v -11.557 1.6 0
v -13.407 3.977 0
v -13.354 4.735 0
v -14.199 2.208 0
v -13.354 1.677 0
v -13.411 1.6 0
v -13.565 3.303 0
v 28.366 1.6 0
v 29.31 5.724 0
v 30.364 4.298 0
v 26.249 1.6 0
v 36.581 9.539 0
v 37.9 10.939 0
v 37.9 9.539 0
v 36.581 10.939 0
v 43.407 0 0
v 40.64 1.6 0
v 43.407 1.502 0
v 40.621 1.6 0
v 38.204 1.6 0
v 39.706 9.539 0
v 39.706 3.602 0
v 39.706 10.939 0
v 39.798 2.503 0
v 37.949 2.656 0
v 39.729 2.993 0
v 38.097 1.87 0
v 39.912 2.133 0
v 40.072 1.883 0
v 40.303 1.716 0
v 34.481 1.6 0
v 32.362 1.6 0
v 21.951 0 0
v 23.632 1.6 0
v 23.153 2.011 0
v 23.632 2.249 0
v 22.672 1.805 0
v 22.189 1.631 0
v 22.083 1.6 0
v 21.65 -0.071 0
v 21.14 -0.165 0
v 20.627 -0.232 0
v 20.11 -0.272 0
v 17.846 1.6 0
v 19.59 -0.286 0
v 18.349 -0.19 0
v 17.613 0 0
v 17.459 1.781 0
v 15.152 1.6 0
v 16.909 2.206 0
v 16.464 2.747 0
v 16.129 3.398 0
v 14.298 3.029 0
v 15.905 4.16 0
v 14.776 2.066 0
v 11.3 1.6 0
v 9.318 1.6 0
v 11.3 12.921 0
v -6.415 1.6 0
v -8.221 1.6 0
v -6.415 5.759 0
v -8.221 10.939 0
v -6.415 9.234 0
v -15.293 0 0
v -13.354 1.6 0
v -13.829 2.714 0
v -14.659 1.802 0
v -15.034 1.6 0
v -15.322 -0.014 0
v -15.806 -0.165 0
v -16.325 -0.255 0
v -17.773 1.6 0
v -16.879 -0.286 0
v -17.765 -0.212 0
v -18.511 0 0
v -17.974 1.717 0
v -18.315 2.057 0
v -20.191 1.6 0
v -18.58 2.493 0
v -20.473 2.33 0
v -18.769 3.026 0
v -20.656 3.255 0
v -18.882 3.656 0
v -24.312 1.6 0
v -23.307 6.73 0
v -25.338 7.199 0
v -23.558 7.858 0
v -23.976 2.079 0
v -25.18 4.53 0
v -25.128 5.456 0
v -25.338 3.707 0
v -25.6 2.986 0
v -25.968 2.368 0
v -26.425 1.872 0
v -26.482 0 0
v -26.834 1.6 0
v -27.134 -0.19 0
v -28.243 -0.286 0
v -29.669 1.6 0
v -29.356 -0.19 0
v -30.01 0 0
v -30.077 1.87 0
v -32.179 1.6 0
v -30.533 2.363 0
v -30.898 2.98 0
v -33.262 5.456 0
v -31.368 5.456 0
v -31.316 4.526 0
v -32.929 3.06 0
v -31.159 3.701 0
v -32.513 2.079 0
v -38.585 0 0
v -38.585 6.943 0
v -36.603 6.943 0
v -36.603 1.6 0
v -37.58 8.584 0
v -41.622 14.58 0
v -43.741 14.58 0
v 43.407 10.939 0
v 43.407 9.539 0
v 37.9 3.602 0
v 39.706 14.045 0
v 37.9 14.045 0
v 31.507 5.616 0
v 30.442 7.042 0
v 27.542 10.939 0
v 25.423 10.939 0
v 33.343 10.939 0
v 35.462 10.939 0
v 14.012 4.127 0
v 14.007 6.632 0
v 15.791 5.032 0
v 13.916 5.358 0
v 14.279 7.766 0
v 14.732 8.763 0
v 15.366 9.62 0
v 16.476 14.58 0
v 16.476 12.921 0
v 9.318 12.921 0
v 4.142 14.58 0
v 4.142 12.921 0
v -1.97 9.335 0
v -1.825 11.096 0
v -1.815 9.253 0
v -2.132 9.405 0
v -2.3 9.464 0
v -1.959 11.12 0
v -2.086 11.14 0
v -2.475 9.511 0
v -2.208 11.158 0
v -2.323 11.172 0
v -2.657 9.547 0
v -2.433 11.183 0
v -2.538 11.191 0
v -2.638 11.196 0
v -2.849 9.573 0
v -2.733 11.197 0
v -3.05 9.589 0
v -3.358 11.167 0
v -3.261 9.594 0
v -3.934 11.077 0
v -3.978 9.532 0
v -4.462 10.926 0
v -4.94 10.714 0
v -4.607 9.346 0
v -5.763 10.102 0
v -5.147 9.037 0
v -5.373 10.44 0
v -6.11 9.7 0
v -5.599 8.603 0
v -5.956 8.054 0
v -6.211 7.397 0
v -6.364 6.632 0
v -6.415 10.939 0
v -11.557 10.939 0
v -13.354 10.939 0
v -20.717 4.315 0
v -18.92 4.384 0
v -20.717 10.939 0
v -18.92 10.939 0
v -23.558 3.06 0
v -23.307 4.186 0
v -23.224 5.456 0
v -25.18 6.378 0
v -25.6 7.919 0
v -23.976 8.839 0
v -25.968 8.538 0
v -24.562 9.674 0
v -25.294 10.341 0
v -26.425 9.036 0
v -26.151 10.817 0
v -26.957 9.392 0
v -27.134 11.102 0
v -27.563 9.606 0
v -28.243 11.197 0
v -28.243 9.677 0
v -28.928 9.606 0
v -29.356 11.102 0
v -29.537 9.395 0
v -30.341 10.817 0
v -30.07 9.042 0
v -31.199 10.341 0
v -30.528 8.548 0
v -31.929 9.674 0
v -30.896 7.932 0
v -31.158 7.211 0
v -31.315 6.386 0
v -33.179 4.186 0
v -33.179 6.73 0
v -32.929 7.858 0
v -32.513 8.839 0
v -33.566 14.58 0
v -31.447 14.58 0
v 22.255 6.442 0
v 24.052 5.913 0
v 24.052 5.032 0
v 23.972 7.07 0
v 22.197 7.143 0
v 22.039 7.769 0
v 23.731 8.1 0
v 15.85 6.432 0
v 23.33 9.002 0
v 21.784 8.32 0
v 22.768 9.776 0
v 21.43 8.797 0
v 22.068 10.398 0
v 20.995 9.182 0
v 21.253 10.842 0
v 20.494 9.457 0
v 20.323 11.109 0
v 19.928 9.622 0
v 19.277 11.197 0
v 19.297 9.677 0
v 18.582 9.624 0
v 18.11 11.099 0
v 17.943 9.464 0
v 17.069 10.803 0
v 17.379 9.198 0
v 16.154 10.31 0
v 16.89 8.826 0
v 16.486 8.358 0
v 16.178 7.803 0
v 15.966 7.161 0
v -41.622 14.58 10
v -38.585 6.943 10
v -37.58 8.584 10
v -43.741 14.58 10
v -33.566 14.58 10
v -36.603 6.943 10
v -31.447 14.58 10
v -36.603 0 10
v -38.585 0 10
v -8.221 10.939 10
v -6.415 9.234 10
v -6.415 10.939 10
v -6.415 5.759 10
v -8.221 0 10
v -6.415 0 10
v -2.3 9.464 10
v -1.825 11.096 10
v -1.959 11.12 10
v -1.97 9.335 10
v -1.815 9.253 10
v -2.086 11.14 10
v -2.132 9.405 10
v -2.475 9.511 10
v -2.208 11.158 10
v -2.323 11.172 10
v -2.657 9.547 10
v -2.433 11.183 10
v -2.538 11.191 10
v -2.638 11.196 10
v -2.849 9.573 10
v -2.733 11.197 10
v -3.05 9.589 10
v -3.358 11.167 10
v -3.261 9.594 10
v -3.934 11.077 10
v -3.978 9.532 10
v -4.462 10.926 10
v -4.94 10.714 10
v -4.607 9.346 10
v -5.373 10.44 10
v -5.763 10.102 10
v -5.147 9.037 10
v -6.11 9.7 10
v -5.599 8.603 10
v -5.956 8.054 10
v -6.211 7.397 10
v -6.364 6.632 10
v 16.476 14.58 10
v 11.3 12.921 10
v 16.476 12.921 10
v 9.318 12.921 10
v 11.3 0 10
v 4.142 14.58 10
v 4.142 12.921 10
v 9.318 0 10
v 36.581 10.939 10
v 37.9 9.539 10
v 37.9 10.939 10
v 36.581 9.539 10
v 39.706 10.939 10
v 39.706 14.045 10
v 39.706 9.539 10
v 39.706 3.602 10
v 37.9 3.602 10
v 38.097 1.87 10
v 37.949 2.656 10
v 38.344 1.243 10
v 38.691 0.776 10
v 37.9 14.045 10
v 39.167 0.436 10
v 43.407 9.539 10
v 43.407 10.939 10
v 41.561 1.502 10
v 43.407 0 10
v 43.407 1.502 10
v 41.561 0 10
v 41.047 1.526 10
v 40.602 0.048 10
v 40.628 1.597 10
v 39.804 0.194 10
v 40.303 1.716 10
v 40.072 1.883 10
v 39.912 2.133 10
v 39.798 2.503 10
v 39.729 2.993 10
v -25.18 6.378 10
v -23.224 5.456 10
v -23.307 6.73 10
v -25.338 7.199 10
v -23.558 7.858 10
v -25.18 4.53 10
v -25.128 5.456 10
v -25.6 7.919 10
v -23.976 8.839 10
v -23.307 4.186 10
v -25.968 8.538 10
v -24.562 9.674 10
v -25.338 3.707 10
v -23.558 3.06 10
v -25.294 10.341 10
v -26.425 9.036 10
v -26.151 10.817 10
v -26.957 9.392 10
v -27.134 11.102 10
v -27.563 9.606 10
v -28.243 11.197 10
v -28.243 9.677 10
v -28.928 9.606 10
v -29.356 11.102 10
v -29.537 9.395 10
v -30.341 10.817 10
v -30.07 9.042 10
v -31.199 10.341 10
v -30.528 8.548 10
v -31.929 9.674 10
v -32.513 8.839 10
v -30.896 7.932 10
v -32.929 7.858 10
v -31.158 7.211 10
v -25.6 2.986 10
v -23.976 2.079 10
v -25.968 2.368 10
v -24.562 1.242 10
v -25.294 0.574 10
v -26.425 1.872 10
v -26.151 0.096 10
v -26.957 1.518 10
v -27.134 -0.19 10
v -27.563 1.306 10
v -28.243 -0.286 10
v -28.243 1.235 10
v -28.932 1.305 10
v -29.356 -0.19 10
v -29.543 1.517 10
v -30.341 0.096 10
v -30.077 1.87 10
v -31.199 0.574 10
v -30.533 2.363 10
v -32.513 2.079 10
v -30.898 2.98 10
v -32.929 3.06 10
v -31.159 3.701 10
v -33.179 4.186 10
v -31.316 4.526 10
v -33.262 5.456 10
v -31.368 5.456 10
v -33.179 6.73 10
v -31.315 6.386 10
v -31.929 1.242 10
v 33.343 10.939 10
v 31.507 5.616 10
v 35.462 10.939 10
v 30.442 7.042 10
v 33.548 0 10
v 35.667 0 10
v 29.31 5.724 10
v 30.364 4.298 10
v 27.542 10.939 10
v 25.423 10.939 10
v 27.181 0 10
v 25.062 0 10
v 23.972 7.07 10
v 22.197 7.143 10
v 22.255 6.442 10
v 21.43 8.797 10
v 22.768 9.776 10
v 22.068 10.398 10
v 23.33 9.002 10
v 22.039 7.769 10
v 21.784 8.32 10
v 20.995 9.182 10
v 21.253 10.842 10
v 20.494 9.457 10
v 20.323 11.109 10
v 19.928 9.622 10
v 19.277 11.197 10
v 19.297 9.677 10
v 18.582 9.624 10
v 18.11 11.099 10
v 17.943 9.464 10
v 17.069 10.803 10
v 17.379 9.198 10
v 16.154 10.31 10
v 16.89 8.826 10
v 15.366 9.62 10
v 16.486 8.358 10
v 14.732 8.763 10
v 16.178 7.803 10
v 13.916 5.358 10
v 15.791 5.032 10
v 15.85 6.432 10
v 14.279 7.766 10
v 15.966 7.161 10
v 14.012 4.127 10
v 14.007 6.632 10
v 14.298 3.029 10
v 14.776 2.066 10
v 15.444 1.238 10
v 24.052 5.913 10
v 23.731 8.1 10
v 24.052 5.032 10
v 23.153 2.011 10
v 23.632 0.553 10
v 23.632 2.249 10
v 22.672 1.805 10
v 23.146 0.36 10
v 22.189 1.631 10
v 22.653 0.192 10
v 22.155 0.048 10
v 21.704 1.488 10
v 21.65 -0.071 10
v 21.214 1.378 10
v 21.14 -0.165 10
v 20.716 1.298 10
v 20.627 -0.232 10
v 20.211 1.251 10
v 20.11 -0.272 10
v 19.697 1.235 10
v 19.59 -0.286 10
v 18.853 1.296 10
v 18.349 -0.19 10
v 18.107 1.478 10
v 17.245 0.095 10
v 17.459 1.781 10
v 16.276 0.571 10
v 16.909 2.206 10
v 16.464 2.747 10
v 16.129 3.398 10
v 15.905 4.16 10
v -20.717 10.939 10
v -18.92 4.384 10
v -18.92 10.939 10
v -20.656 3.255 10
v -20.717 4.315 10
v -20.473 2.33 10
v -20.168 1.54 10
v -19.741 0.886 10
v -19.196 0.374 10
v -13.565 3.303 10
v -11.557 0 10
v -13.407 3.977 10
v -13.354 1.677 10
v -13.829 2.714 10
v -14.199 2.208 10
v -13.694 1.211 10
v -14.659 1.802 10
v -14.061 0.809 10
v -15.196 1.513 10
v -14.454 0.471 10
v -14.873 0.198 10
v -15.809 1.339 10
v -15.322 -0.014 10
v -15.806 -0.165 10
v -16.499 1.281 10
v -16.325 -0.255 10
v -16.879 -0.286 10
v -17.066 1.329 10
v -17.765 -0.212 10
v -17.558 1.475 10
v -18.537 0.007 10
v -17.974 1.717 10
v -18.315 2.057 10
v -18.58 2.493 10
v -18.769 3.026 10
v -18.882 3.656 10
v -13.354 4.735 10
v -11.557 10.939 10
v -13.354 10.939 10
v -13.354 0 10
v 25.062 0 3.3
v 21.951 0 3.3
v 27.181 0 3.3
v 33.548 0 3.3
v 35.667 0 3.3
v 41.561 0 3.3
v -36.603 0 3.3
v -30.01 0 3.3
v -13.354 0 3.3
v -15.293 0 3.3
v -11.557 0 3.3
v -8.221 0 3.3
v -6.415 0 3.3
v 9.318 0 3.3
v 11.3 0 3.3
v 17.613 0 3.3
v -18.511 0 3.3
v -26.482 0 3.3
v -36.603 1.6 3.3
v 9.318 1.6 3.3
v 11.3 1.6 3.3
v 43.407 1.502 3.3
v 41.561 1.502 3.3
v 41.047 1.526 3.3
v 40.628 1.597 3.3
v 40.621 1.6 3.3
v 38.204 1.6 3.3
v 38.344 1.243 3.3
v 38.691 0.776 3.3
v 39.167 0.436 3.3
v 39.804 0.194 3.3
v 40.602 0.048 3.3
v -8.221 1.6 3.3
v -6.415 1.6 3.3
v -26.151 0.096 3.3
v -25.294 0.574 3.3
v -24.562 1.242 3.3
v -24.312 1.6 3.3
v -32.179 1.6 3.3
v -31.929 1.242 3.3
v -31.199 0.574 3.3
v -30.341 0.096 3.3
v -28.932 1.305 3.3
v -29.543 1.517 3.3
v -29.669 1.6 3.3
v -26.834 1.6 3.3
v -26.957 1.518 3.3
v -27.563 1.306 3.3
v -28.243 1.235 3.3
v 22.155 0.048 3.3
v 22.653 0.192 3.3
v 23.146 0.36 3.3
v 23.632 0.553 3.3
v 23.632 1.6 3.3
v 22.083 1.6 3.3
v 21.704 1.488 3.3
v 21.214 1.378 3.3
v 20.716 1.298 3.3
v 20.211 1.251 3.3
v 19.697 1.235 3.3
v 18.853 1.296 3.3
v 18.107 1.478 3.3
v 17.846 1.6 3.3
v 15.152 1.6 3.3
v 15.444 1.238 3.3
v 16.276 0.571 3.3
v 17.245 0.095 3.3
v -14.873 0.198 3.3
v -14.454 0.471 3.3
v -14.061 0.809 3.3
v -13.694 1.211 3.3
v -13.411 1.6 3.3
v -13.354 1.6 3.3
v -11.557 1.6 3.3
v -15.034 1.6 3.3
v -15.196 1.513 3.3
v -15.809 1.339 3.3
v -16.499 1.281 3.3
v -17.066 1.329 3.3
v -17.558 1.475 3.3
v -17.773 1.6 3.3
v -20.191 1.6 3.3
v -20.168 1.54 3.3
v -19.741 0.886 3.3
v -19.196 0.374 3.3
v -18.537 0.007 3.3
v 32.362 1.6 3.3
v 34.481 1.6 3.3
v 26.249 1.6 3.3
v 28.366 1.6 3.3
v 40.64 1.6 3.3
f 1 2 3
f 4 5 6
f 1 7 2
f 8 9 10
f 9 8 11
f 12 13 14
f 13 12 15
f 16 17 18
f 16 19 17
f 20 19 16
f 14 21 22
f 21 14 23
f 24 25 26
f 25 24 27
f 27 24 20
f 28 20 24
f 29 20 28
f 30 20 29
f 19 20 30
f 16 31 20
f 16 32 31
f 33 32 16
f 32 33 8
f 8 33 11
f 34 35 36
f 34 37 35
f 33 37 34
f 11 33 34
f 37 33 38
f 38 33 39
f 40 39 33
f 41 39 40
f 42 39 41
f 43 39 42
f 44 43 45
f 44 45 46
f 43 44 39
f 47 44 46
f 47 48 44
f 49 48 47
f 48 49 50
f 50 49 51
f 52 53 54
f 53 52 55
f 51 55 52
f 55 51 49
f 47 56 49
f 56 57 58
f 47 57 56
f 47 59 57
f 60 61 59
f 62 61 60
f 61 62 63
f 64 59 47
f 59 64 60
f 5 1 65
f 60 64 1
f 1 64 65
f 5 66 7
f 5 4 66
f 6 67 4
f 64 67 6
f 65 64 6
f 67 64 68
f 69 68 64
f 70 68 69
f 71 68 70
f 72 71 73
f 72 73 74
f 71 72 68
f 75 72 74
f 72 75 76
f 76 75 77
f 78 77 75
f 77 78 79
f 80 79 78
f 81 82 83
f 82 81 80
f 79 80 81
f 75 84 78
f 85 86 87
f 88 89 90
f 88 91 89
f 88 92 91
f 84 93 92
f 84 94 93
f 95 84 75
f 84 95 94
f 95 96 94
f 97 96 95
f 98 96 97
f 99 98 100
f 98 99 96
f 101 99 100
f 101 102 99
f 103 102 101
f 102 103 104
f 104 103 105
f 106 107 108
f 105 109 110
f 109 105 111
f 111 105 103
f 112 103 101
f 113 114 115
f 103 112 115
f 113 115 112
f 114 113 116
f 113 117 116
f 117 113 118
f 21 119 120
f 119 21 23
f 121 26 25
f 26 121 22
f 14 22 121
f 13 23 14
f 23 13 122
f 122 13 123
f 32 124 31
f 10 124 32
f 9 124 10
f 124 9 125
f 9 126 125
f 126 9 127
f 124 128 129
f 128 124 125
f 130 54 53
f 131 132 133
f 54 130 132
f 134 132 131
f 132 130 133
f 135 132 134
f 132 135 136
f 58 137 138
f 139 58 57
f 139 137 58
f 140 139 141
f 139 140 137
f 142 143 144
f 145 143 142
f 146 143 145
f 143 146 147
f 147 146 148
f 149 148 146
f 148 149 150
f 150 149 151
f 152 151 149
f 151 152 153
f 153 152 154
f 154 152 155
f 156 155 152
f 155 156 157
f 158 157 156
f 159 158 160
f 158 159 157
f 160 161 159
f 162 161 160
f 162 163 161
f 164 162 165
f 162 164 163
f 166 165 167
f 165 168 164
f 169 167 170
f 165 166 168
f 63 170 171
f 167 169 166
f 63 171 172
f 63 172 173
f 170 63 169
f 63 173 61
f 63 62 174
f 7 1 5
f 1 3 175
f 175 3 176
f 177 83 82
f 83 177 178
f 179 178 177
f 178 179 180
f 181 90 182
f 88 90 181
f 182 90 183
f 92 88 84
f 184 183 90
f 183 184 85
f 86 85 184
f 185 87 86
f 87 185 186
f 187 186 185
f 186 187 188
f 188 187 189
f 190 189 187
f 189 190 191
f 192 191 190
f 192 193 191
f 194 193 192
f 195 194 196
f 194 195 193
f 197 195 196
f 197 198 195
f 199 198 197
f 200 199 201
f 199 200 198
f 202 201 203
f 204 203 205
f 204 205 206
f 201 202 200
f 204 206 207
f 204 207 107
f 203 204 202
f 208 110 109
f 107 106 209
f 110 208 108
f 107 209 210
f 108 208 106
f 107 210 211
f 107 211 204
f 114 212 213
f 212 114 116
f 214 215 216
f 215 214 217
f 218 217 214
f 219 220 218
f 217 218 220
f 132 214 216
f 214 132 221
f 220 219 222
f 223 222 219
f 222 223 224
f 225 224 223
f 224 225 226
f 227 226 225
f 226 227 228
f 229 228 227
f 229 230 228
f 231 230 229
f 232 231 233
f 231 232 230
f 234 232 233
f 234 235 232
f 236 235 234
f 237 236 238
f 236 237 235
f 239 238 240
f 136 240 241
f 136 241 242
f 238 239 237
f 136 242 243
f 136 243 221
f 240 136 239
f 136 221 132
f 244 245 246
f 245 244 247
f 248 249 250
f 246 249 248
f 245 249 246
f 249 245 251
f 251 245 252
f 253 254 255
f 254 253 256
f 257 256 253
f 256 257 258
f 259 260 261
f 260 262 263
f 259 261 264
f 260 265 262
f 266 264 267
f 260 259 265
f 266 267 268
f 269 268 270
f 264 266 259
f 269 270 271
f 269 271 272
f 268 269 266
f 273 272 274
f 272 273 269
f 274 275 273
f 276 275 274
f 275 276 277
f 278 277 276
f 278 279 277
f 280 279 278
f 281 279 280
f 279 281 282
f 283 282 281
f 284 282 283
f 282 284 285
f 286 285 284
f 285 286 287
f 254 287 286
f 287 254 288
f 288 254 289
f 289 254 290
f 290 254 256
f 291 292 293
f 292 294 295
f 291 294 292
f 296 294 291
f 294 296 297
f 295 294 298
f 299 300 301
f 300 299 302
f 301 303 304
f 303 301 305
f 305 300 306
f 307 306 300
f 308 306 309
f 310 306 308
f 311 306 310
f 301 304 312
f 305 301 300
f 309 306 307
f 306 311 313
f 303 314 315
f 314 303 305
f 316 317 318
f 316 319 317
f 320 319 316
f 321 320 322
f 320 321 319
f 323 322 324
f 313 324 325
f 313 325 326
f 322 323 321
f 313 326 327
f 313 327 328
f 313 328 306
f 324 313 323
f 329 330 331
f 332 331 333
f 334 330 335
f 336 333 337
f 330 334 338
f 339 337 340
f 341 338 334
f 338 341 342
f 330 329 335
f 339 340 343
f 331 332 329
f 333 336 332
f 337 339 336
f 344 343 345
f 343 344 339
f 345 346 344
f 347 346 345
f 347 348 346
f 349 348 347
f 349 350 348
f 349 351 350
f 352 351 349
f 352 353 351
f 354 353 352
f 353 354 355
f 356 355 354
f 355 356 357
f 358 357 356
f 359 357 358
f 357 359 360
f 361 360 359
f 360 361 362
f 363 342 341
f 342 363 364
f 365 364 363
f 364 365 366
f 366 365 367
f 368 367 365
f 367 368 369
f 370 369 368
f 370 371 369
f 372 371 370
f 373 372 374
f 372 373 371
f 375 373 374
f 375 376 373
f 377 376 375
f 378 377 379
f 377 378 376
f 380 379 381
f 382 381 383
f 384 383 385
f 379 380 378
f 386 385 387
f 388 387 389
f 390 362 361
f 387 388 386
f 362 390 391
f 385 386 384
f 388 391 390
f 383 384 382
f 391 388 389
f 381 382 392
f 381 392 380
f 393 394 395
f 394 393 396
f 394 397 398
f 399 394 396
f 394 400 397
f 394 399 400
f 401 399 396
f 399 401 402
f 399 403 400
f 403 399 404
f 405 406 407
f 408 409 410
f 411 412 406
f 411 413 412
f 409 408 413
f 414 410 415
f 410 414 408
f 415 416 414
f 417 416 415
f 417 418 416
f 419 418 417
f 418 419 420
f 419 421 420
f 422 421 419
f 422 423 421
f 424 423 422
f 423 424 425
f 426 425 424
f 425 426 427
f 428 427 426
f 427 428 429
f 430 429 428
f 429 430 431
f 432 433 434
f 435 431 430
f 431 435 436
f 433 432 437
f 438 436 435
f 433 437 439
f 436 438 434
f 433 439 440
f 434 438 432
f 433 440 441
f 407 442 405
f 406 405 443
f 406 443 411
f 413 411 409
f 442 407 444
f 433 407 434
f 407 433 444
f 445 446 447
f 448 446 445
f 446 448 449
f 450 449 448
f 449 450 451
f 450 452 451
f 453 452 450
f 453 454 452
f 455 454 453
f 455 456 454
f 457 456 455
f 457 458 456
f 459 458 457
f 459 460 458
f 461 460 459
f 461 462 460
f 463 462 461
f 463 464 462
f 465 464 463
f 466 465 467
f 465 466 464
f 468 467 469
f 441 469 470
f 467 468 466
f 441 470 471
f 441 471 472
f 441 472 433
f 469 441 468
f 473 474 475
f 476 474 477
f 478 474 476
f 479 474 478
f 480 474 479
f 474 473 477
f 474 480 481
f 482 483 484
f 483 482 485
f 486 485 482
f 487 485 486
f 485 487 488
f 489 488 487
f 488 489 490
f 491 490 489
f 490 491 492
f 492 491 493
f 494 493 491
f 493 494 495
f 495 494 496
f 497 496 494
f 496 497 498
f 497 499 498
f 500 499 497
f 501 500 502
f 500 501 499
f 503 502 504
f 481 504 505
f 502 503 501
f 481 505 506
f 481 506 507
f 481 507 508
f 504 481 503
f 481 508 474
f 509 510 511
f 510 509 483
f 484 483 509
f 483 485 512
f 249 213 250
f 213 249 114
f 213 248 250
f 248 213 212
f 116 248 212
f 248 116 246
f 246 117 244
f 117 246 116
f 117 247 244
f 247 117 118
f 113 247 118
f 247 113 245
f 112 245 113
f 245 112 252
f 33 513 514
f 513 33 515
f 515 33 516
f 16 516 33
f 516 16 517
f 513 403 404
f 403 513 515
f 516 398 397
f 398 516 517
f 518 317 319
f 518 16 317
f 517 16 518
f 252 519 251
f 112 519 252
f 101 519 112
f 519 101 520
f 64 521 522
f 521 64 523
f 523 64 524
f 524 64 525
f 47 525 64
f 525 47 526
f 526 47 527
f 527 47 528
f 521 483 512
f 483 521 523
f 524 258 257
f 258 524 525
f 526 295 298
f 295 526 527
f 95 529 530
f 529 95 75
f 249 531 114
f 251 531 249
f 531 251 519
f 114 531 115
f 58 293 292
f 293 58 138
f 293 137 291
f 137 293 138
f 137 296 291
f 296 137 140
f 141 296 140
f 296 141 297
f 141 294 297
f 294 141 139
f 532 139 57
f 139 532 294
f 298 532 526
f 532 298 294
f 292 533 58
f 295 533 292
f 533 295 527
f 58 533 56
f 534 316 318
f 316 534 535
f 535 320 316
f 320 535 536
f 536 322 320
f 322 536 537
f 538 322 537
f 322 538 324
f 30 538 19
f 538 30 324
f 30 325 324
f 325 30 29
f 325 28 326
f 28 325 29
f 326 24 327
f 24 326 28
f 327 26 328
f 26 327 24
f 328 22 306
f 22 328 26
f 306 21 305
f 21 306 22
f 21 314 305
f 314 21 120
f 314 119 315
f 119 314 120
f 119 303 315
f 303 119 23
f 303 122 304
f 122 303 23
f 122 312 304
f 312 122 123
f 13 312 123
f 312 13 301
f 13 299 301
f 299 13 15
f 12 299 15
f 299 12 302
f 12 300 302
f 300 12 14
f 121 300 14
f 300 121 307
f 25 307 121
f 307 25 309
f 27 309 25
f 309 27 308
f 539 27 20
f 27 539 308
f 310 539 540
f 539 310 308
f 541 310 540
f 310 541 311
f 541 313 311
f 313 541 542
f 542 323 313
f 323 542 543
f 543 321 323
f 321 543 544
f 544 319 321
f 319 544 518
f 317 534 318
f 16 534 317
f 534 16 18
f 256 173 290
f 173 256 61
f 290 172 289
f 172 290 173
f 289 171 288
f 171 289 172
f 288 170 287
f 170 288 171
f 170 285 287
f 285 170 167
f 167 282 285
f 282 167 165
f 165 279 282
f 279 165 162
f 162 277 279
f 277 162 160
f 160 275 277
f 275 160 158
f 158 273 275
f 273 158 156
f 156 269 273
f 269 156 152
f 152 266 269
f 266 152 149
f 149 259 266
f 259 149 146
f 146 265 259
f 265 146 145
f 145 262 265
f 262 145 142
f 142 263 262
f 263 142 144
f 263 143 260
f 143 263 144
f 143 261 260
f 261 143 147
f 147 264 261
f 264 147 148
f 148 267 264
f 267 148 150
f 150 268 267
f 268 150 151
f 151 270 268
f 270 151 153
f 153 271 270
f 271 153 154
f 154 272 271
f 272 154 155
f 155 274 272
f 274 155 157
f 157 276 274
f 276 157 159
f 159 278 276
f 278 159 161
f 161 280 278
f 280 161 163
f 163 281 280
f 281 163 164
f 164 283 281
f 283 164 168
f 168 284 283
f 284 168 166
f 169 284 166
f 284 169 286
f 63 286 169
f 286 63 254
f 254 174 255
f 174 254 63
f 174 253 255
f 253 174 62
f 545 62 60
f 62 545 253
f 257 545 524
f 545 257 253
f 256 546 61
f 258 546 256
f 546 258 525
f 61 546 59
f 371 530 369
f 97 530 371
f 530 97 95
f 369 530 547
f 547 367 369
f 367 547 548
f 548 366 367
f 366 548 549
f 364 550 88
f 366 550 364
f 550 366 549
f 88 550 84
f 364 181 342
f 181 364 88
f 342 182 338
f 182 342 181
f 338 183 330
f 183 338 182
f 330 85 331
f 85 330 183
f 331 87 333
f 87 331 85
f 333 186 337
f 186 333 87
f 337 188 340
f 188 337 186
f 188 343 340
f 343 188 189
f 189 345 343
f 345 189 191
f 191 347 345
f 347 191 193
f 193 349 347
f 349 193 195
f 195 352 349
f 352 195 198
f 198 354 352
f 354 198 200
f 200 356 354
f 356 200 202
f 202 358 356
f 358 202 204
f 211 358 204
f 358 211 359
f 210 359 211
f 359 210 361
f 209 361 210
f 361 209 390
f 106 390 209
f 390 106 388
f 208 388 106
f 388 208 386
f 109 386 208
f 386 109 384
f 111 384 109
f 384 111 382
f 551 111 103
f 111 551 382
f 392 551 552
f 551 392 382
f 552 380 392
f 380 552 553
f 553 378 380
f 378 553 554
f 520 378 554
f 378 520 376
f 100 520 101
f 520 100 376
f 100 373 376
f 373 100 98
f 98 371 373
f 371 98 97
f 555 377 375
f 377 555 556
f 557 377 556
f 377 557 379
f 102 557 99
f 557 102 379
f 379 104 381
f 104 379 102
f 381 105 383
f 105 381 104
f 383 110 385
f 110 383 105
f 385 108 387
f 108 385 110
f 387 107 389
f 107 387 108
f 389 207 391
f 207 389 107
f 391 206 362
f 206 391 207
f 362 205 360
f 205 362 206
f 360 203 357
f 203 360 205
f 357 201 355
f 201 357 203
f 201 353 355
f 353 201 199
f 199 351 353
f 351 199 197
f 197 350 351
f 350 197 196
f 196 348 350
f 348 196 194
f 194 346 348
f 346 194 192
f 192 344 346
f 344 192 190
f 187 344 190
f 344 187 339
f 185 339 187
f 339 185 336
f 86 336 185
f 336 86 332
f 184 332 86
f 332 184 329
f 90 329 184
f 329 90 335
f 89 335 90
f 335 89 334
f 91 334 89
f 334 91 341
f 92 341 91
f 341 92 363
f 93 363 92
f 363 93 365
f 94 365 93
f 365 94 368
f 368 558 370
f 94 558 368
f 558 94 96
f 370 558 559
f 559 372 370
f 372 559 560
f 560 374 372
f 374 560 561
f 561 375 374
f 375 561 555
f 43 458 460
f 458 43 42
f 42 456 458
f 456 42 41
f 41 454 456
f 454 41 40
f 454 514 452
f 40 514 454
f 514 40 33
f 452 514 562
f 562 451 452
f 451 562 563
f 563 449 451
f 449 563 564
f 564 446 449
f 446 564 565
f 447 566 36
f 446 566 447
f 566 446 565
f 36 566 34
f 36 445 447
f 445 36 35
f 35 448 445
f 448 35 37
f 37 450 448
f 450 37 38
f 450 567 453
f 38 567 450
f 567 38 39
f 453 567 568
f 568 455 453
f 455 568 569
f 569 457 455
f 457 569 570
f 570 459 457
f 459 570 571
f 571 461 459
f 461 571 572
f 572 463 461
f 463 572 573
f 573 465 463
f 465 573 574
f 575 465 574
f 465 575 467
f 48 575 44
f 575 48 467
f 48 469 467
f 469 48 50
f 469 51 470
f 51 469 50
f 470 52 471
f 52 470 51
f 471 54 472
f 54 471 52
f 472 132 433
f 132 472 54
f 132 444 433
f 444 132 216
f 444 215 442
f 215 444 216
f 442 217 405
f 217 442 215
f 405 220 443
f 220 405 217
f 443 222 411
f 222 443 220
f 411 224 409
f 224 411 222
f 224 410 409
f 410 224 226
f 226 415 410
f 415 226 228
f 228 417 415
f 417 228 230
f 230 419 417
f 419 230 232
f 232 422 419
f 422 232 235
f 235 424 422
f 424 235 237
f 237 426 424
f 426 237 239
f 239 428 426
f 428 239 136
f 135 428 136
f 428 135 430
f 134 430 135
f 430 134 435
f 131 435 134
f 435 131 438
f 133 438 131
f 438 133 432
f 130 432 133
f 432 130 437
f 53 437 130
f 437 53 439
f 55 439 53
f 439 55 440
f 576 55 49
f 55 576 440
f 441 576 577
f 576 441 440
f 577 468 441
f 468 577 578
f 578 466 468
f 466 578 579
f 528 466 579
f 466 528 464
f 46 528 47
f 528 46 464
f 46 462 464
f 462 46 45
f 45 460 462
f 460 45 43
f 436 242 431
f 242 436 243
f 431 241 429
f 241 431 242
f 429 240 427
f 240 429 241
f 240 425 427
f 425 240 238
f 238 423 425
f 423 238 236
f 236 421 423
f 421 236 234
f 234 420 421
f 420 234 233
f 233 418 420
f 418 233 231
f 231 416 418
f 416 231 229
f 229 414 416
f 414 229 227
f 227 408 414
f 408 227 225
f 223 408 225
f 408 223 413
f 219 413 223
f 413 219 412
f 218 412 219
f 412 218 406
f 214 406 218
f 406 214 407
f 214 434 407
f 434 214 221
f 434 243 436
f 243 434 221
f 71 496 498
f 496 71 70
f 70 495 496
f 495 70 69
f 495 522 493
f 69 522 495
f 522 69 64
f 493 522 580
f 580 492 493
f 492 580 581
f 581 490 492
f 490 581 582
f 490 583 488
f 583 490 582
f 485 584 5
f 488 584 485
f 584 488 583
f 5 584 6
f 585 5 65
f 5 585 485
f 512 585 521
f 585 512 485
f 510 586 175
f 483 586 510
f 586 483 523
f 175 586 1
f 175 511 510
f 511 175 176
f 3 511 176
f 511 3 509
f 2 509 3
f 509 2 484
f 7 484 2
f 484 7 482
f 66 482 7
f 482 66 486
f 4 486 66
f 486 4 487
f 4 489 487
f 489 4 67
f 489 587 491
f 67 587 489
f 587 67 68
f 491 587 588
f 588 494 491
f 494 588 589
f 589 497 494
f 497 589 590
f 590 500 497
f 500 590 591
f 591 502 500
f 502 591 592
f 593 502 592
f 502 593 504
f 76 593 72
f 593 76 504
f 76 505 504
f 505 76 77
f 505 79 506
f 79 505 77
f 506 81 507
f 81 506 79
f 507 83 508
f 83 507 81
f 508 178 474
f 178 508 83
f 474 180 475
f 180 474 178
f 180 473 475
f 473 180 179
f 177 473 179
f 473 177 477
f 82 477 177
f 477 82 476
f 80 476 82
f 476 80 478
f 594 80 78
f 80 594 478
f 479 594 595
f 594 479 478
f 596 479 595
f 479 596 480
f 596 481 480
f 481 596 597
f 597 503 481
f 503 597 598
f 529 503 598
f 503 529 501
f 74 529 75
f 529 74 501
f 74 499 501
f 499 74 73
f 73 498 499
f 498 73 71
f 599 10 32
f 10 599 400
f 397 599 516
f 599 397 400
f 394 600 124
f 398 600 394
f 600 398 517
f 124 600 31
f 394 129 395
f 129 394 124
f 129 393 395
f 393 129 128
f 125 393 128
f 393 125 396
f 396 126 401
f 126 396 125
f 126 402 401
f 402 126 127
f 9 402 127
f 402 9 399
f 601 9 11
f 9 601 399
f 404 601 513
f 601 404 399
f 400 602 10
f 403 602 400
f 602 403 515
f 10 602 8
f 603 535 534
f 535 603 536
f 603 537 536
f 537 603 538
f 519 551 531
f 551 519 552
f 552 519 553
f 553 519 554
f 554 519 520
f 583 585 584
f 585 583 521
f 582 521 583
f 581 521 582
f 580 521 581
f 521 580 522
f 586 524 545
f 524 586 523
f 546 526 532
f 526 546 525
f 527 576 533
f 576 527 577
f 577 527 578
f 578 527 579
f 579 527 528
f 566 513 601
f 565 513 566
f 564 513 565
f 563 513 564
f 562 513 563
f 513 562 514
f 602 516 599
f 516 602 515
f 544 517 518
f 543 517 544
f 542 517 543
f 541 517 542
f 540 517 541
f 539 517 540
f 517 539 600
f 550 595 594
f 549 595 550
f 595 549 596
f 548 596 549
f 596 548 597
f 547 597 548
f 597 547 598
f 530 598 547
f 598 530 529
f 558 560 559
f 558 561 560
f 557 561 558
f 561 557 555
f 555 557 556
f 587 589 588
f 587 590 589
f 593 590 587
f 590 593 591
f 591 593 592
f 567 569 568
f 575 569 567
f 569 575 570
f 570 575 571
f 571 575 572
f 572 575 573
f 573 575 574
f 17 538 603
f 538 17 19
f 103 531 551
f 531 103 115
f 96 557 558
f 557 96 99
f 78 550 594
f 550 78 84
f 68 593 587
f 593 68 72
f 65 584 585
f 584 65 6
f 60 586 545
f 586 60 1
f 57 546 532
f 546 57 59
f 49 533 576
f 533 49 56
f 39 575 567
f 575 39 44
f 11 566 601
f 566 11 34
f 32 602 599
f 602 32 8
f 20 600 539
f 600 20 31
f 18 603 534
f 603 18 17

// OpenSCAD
//Set the text to render
textstring="Your Text";

//Font name, e.g. "Libration Sans", "Aldo", depends on what is available on the platform. In the customizer,choose from about 700 Google Fonts. For an overview please refer: http://www.google.com/fonts
fontname="Orbitron"; //[ABeeZee,Abel,Abril Fatface,Aclonica,Acme,Actor,Adamina,Advent Pro,Aguafina Script,Akronim,Aladin,Aldrich,Alef,Alegreya,Alegreya Sans,Alegreya Sans SC,Alegreya SC,Alex Brush,Alfa Slab One,Alice,Alike,Alike Angular,Allan,Allerta,Allerta Stencil,Allura,Almendra,Almendra Display,Almendra SC,Amarante,Amaranth,Amatic SC,Amethysta,Amiri,Anaheim,Andada,Andika,Angkor,Annie Use Your Telescope,Anonymous Pro,Antic,Antic Didone,Antic Slab,Anton,Arapey,Arbutus,Arbutus Slab,Architects Daughter,Archivo Black,Archivo Narrow,Arimo,Arizonia,Armata,Artifika,Arvo,Asap,Asset,Astloch,Asul,Atomic Age,Aubrey,Audiowide,Autour One,Average,Average Sans,Averia Gruesa Libre,Averia Libre,Averia Sans Libre,Averia Serif Libre,Bad Script,Balthazar,Bangers,Basic,Battambang,Baumans,Bayon,Belgrano,Belleza,BenchNine,Bentham,Berkshire Swash,Bevan,Bigelow Rules,Bigshot One,Bilbo,Bilbo Swash Caps,Bitter,Black Ops One,Bokor,Bonbon,Boogaloo,Bowlby One,Bowlby One SC,Brawler,Bree Serif,Bubblegum Sans,Bubbler One,Buda,Buenard,Butcherman,Butterfly Kids,Cabin,Cabin Condensed,Cabin Sketch,Caesar Dressing,Cagliostro,Calligraffitti,Cambay,Cambo,Candal,Cantarell,Cantata One,Cantora One,Capriola,Cardo,Carme,Carrois Gothic,Carrois Gothic SC,Carter One,Caudex,Cedarville Cursive,Ceviche One,Changa One,Chango,Chau Philomene One,Chela One,Chelsea Market,Chenla,Cherry Cream Soda,Cherry Swash,Chewy,Chicle,Chivo,Cinzel,Cinzel Decorative,Clicker Script,Coda,Coda Caption,Codystar,Combo,Comfortaa,Coming Soon,Concert One,Condiment,Content,Contrail One,Convergence,Cookie,Copse,Corben,Courgette,Cousine,Coustard,Covered By Your Grace,Crafty Girls,Creepster,Crete Round,Crimson Text,Croissant One,Crushed,Cuprum,Cutive,Cutive Mono,Damion,Dancing Script,Dangrek,Dawning of a New Day,Days One,Dekko,Delius,Delius Swash Caps,Delius Unicase,Della Respira,Denk One,Devonshire,Dhurjati,Didact Gothic,Diplomata,Diplomata SC,Domine,Donegal One,Doppio One,Dorsa,Dosis,Dr Sugiyama,Droid Sans,Droid Sans Mono,Droid Serif,Duru Sans,Dynalight,Eagle Lake,Eater,EB Garamond,Economica,Ek Mukta,Electrolize,Elsie,Elsie Swash Caps,Emblema One,Emilys Candy,Engagement,Englebert,Enriqueta,Erica One,Esteban,Euphoria Script,Ewert,Exo,Exo 2,Expletus Sans,Fanwood Text,Fascinate,Fascinate Inline,Faster One,Fasthand,Fauna One,Federant,Federo,Felipa,Fenix,Finger Paint,Fira Mono,Fira Sans,Fjalla One,Fjord One,Flamenco,Flavors,Fondamento,Fontdiner Swanky,Forum,Francois One,Freckle Face,Fredericka the Great,Fredoka One,Freehand,Fresca,Frijole,Fruktur,Fugaz One,Gabriela,Gafata,Galdeano,Galindo,Gentium Basic,Gentium Book Basic,Geo,Geostar,Geostar Fill,Germania One,GFS Didot,GFS Neohellenic,Gidugu,Gilda Display,Give You Glory,Glass Antiqua,Glegoo,Gloria Hallelujah,Goblin One,Gochi Hand,Gorditas,Goudy Bookletter 1911,Graduate,Grand Hotel,Gravitas One,Great Vibes,Griffy,Gruppo,Gudea,Gurajada,Habibi,Halant,Hammersmith One,Hanalei,Hanalei Fill,Handlee,Hanuman,Happy Monkey,Headland One,Henny Penny,Herr Von Muellerhoff,Hind,Holtwood One SC,Homemade Apple,Homenaje,Iceberg,Iceland,IM Fell Double Pica,IM Fell Double Pica SC,IM Fell DW Pica,IM Fell DW Pica SC,IM Fell English,IM Fell English SC,IM Fell French Canon,IM Fell French Canon SC,IM Fell Great Primer,IM Fell Great Primer SC,Imprima,Inconsolata,Inder,Indie Flower,Inika,Irish Grover,Istok Web,Italiana,Italianno,Jacques Francois,Jacques Francois Shadow,Jim Nightshade,Jockey One,Jolly Lodger,Josefin Sans,Josefin Slab,Joti One,Judson,Julee,Julius Sans One,Junge,Jura,Just Another Hand,Just Me Again Down Here,Kalam,Kameron,Kantumruy,Karla,Karma,Kaushan Script,Kavoon,Kdam Thmor,Keania One,Kelly Slab,Kenia,Khand,Khmer,Khula,Kite One,Knewave,Kotta One,Koulen,Kranky,Kreon,Kristi,Krona One,La Belle Aurore,Laila,Lakki Reddy,Lancelot,Lateef,Lato,League Script,Leckerli One,Ledger,Lekton,Lemon,Liberation Sans,Libre Baskerville,Life Savers,Lilita One,Lily Script One,Limelight,Linden Hill,Lobster,Lobster Two,Londrina Outline,Londrina Shadow,Londrina Sketch,Londrina Solid,Lora,Love Ya Like A Sister,Loved by the King,Lovers Quarrel,Luckiest Guy,Lusitana,Lustria,Macondo,Macondo Swash Caps,Magra,Maiden Orange,Mako,Mallanna,Mandali,Marcellus,Marcellus SC,Marck Script,Margarine,Marko One,Marmelad,Martel Sans,Marvel,Mate,Mate SC,Maven Pro,McLaren,Meddon,MedievalSharp,Medula One,Megrim,Meie Script,Merienda,Merienda One,Merriweather,Merriweather Sans,Metal,Metal Mania,Metamorphous,Metrophobic,Michroma,Milonga,Miltonian,Miltonian Tattoo,Miniver,Miss Fajardose,Modak,Modern Antiqua,Molengo,Molle,Monda,Monofett,Monoton,Monsieur La Doulaise,Montaga,Montez,Montserrat,Montserrat Alternates,Montserrat Subrayada,Moul,Moulpali,Mountains of Christmas,Mouse Memoirs,Mr Bedfort,Mr Dafoe,Mr De Haviland,Mrs Saint Delafield,Mrs Sheppards,Muli,Mystery Quest,Neucha,Neuton,New Rocker,News Cycle,Niconne,Nixie One,Nobile,Nokora,Norican,Nosifer,Nothing You Could Do,Noticia Text,Noto Sans,Noto Serif,Nova Cut,Nova Flat,Nova Mono,Nova Oval,Nova Round,Nova Script,Nova Slim,Nova Square,NTR,Numans,Nunito,Odor Mean Chey,Offside,Old Standard TT,Oldenburg,Oleo Script,Oleo Script Swash Caps,Open Sans,Open Sans Condensed,Oranienbaum,Orbitron,Oregano,Orienta,Original Surfer,Oswald,Over the Rainbow,Overlock,Overlock SC,Ovo,Oxygen,Oxygen Mono,Pacifico,Paprika,Parisienne,Passero One,Passion One,Pathway Gothic One,Patrick Hand,Patrick Hand SC,Patua One,Paytone One,Peddana,Peralta,Permanent Marker,Petit Formal Script,Petrona,Philosopher,Piedra,Pinyon Script,Pirata One,Plaster,Play,Playball,Playfair Display,Playfair Display SC,Podkova,Poiret One,Poller One,Poly,Pompiere,Pontano Sans,Port Lligat Sans,Port Lligat Slab,Prata,Preahvihear,Press Start 2P,Princess Sofia,Prociono,Prosto One,PT Mono,PT Sans,PT Sans Caption,PT Sans Narrow,PT Serif,PT Serif Caption,Puritan,Purple Purse,Quando,Quantico,Quattrocento,Quattrocento Sans,Questrial,Quicksand,Quintessential,Qwigley,Racing Sans One,Radley,Rajdhani,Raleway,Raleway Dots,Ramabhadra,Ramaraja,Rambla,Rammetto One,Ranchers,Rancho,Ranga,Rationale,Ravi Prakash,Redressed,Reenie Beanie,Revalia,Ribeye,Ribeye Marrow,Righteous,Risque,Roboto,Roboto Condensed,Roboto Slab,Rochester,Rock Salt,Rokkitt,Romanesco,Ropa Sans,Rosario,Rosarivo,Rouge Script,Rozha One,Rubik Mono One,Rubik One,Ruda,Rufina,Ruge Boogie,Ruluko,Rum Raisin,Ruslan Display,Russo One,Ruthie,Rye,Sacramento,Sail,Salsa,Sanchez,Sancreek,Sansita One,Sarina,Sarpanch,Satisfy,Scada,Scheherazade,Schoolbell,Seaweed Script,Sevillana,Seymour One,Shadows Into Light,Shadows Into Light Two,Shanti,Share,Share Tech,Share Tech Mono,Shojumaru,Short Stack,Siemreap,Sigmar One,Signika,Signika Negative,Simonetta,Sintony,Sirin Stencil,Six Caps,Skranji,Slabo 13px,Slabo 27px,Slackey,Smokum,Smythe,Sniglet,Snippet,Snowburst One,Sofadi One,Sofia,Sonsie One,Sorts Mill Goudy,Source Code Pro,Source Sans Pro,Source Serif Pro,Special Elite,Spicy Rice,Spinnaker,Spirax,Squada One,Sree Krushnadevaraya,Stalemate,Stalinist One,Stardos Stencil,Stint Ultra Condensed,Stint Ultra Expanded,Stoke,Strait,Sue Ellen Francisco,Sunshiney,Supermercado One,Suranna,Suravaram,Suwannaphum,Swanky and Moo Moo,Syncopate,Tangerine,Taprom,Tauri,Teko,Telex,Tenali Ramakrishna,Tenor Sans,Text Me One,The Girl Next Door,Tienne,Timmana,Tinos,Titan One,Titillium Web,Trade Winds,Trocchi,Trochut,Trykker,Tulpen One,Ubuntu,Ubuntu Condensed,Ubuntu Mono,Ultra,Uncial Antiqua,Underdog,Unica One,UnifrakturCook,UnifrakturMaguntia,Unkempt,Unlock,Unna,Vampiro One,Varela,Varela Round,Vast Shadow,Vesper Libre,Vibur,Vidaloka,Viga,Voces,Volkhov,Vollkorn,Voltaire,VT323,Waiting for the Sunrise,Wallpoet,Walter Turncoat,Warnes,Wellfleet,Wendy One,Wire One,Yanone Kaffeesatz,Yellowtail,Yeseva One,Yesteryear,Zeyada]


//If you want to add a special character left or right, activate it here. Select wether it should be on the left or right side.
add_a_special_character="none"; //[left, right, none]

//... and select your special character, like a heart, etc.
special_character=9835;//[9829:Heart,8224:Cross,8592:Left arrow,8594:Right arrow,9834:Note,9835:Double note,9658:Thick right arrow,9668:Thick left arrow,9787:Full smiley,9788:Sun,9674:Diamond unfilled,9830:Diamond,9824:Spades,9827:Club,33:!,63:?,8593:Up arrow,8595:Down arrow]

// select distance of the special char from the text (in percent of the special char size)
distance_special_char = .6; 

//Use a rounded base to connect all letters or use a connecting bar?
RoundedBase=0; //[0, 1]

//Shift the font up/down to connect i and j dots? Select "no" if you have no i or j in your text.
do_shift_font="automatic"; //[automatic,yes,no]

//Set font size in mm
textsize=16; 

//Text height (extrusion) in mm
textheight=10;

//Connecting bar height (extrusion in print direction) in percent of the text height
baseheight_percent=.33;
baseheight=textheight*baseheight_percent;

//Connecting bar thickness in percent of the font size
basethickness_percent=0.1;
basethickness=textsize*basethickness_percent;

//Amount to shift the font up/down to connect i and j dots for printing. 
font_catch_diacritical_sign=2.3; 

//Only for a rounded base: Base increase size to make letters meet, in percent of the textsize
base_radius_add_percent=.1;
base_radius_add=textsize*base_radius_add_percent;

/* [Hidden] */
//-------------------------------------------------------------------------------

iorj = [ for (i = [0 : len(textstring) - 1]) if (textstring[i]=="i" || textstring[i]=="j") 1 ];

dummy_cutoutlen=len(textstring)*textsize;

specialcharsize = (add_a_special_character=="none" ? 0 : textsize*1.2) ; 
distancespecialchar = specialcharsize*distance_special_char;
cutcube_x_nospecialchar=(len(textstring)+1)*textsize; 
cutcube_x=cutcube_x_nospecialchar+specialcharsize+distancespecialchar; 
cutcube_yz=textsize; 

/*
Name and Text
Version F, March 2015
Written by MC Geisler (mcgenki at gmail dot com)

This is a proper configurable name plate, consisting of separate extruded letters. Use the variables to get the text you need.

Each letter and also the dots of 'i' and 'j' are connected together, so after printing it will not fall apart.

Use it to create mini name tags (the text in the picture is 9mm high) or big text sculptures!

Have fun!

License: Attribution 4.0 International (CC BY 4.0)

You are free to:
    Share - copy and redistribute the material in any medium or format
    Adapt - remix, transform, and build upon the material
    for any purpose, even commercially.
*/


module writetext(textstr, sizeit, add_a_special_character_connector)
{
    halignvalue = (add_a_special_character=="none" ? "center" : (add_a_special_character=="left" ? "left" : "right") );

    move_to_middle = (add_a_special_character=="left" ? -1 : 1)*(add_a_special_character=="none" ? 0 : cutcube_x_nospecialchar/4); 

    translate([move_to_middle,0,0])
    {
      
        text(textstr,size=sizeit*.9,font=fontname,halign=halignvalue,valign="baseline");  //v = center
        
        if (add_a_special_character!="none")
        {
            translate([ (add_a_special_character=="left" ? -1 : 1)*distancespecialchar,0,0])
                text(chr(special_character),size=specialcharsize,font="Noto Symbols",halign="center",valign="baseline");
            
            if(add_a_special_character_connector==1)
            {
                connectorsize=specialcharsize*.3;
                
                translate([ -distancespecialchar, -connectorsize/2])
                    square([specialcharsize,connectorsize], center="true");
            }
        }
    }
}


module RiseText(textstr, textsize,textheight) 
{

    linear_extrude(height=textheight,convexity = 10)
        writetext(textstr, textsize,0);

    //create base
    if(RoundedBase==0)
    {
        //base line to connect
        linear_extrude(height=baseheight, twist=0, slices=1, $fn=32) 
            hull()
                intersection()
                {
                    writetext(textstr, textsize,1);
                    
                    //translate([0,-textsize/2+basethickness/2+base_offset,0])
                    translate([0,basethickness/2,0])
                       square([dummy_cutoutlen,basethickness],center=true);
                }
              
        if ( (do_shift_font=="automatic" && iorj[0]==1) || do_shift_font=="yes")  
        {
            //connect i and j dots
            assign(delta=textsize/30*font_catch_diacritical_sign)
               intersection()
               {
                   //connect the dots but maybe too much in other locations
                   linear_extrude(height=baseheight/2,convexity = 10)
                        offset(delta=-delta)   
                            offset(delta=delta)
                                writetext(textstr, textsize,0);
               
                   //connect only vertical parts by shifting
                   linear_extrude(height=baseheight/2,convexity = 10)
                       for ( i = [-1 : 1] )
                           translate([0,i*delta,0])
                                writetext(textstr, textsize,0);
               }
       }

    }
    else        
    {
                linear_extrude(height=baseheight, twist=0, slices=1, $fn=32) 
                    offset(r = base_radius_add) 
                    {
                        writetext(textstr, textsize,1);
                    }
    }

}

RiseText(textstring,textsize,textheight);
